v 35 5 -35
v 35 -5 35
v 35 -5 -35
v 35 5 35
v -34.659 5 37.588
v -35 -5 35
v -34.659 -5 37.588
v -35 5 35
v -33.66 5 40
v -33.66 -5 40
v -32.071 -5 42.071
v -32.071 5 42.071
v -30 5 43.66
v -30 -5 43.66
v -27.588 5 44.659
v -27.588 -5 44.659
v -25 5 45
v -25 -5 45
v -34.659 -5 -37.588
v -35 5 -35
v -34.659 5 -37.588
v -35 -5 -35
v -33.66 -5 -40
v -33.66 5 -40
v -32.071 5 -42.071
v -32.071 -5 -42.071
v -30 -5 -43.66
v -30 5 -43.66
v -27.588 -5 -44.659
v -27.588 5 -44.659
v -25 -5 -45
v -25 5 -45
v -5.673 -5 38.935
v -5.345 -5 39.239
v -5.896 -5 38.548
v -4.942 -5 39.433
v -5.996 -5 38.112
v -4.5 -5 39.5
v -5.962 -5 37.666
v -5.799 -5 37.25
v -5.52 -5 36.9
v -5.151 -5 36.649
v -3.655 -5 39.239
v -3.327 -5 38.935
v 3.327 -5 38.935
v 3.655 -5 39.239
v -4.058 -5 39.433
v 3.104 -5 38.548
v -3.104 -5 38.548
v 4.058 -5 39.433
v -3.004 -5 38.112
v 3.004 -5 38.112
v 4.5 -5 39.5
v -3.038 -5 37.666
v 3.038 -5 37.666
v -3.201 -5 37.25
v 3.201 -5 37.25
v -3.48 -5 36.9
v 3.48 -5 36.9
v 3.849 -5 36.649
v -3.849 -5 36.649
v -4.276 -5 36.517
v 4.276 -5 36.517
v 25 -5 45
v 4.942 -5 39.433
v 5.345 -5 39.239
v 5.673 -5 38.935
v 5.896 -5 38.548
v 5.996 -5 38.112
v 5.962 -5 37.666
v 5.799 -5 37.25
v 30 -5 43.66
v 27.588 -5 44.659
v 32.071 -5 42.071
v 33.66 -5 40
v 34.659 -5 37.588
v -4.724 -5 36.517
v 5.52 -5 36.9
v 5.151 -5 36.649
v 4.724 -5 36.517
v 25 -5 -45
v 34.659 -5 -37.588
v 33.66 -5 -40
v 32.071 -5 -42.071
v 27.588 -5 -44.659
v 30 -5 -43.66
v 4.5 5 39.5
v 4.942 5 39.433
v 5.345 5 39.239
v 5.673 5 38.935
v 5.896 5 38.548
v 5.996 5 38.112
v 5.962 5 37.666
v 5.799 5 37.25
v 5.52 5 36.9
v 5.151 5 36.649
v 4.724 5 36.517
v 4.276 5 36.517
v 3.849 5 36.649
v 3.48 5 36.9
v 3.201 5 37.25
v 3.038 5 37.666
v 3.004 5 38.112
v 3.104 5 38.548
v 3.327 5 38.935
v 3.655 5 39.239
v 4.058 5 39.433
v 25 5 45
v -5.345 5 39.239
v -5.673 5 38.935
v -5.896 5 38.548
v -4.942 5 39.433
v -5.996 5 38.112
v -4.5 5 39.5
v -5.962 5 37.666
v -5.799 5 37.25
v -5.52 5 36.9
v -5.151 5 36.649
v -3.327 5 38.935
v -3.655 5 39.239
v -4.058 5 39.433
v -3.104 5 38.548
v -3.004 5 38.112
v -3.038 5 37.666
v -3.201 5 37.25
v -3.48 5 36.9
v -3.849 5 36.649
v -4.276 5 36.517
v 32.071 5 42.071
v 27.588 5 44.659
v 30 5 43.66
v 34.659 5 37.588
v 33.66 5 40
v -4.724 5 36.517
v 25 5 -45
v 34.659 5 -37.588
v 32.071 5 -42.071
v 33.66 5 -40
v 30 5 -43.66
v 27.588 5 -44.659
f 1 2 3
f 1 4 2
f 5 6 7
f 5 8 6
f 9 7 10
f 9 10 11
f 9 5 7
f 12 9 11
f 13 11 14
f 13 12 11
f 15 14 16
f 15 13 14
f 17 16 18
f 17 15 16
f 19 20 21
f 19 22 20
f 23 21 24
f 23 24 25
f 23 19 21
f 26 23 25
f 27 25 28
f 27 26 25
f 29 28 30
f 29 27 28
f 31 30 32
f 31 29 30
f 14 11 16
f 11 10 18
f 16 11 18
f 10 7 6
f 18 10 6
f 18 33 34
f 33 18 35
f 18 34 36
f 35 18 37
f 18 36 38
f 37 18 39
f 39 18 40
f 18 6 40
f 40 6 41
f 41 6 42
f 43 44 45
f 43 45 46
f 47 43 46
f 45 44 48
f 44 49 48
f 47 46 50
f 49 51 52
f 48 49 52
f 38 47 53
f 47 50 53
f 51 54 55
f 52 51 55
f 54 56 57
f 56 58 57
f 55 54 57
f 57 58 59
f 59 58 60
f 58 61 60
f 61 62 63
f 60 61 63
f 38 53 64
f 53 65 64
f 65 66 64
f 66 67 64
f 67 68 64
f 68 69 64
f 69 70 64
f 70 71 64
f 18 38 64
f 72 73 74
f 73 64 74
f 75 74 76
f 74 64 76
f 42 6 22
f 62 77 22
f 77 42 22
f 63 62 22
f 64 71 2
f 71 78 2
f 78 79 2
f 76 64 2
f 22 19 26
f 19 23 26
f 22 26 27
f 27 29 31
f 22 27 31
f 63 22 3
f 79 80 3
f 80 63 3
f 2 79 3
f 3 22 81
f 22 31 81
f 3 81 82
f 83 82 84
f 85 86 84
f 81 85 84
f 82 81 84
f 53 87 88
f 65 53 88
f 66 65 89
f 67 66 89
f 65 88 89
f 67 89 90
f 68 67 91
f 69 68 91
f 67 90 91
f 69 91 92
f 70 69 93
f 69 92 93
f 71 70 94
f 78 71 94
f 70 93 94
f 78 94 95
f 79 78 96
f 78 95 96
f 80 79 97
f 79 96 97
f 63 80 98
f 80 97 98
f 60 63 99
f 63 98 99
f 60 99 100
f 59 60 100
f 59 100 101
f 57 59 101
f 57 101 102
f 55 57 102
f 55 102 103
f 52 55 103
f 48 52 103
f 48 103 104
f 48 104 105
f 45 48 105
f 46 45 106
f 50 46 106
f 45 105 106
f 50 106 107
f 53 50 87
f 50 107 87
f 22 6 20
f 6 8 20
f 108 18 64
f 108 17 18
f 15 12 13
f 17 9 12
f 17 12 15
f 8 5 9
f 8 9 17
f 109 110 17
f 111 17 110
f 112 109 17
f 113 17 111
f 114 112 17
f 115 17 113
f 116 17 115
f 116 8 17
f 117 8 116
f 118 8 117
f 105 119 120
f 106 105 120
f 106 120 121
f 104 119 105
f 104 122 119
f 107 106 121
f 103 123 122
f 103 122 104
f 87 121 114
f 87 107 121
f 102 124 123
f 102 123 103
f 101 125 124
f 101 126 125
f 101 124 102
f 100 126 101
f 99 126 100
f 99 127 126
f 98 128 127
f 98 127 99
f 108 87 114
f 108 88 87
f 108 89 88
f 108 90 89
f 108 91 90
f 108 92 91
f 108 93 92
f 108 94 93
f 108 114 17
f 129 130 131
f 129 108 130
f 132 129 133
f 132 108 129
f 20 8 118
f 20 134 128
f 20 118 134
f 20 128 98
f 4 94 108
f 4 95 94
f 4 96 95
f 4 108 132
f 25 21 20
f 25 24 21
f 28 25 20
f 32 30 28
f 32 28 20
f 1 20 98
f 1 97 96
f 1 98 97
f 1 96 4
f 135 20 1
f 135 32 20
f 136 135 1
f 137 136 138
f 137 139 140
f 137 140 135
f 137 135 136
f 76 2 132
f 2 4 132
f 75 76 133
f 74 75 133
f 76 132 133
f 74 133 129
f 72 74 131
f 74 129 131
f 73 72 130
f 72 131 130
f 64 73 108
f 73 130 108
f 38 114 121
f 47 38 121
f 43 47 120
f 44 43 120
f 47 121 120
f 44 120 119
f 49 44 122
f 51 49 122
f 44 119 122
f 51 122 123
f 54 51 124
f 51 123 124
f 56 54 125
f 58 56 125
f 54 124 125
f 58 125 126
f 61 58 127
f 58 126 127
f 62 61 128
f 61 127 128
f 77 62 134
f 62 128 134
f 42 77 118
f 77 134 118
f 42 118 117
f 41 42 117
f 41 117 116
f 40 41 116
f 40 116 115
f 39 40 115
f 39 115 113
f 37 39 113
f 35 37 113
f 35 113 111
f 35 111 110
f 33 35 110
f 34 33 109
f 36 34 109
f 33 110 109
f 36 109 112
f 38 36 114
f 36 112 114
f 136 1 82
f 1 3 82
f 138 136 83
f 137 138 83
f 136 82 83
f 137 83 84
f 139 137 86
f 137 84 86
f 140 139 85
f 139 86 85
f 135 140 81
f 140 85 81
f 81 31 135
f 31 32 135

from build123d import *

# Parameters (mm, degrees)
SKETCH1_W           = 70
SKETCH1_H           = 90
BOSS_EXTRUDE1_DEPTH = 5
FILLET1_R           = 10
SKETCH2_R           = 1.5
CUT_EXTRUDE1_DEPTH  = 10


with BuildPart() as part:
    # Sketch1 → Boss-Extrude1 (new, symmetric)
    with BuildSketch(Plane(origin=(0, 0, 0), x_dir=(1, 0, 0), z_dir=(0, 1, 0))):
        Rectangle(SKETCH1_W, SKETCH1_H)
    extrude(amount=BOSS_EXTRUDE1_DEPTH, both=True)

    # Fillet1
    fillet1_edges = [part.edges().sort_by_distance(p)[0] for p in [
        (-35, 0, -45),
        (35, 0, -45),
        (35, 0, 45),
        (-35, 0, 45),
    ]]
    fillet(fillet1_edges, radius=FILLET1_R)

    # Sketch2 → Cut-Extrude1 (cut)
    with BuildSketch(Plane(origin=(0, 5, 0), x_dir=(1, 0, 0), z_dir=(0, 1, 0))):
        with Locations(Location((-4.5, -38, 0), (0, 0, 270))):
            Circle(SKETCH2_R)
        with Locations(Location((4.5, -38, 0), (0, 0, 270))):
            Circle(SKETCH2_R)
    extrude(amount=-CUT_EXTRUDE1_DEPTH, mode=Mode.SUBTRACT)


solid = part.part
